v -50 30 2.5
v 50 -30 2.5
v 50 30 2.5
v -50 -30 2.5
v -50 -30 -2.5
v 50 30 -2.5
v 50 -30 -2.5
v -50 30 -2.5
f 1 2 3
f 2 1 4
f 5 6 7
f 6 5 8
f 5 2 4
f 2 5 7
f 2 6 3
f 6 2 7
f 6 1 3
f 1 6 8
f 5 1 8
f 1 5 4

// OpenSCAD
// Starter file for task-011.
// Edit this file in OpenSCAD to complete the requested hard task.
$fn = 64;

cover_w = 100;
cover_d = 60;
cover_t = 5;
cube([cover_w, cover_d, cover_t], center=true);
